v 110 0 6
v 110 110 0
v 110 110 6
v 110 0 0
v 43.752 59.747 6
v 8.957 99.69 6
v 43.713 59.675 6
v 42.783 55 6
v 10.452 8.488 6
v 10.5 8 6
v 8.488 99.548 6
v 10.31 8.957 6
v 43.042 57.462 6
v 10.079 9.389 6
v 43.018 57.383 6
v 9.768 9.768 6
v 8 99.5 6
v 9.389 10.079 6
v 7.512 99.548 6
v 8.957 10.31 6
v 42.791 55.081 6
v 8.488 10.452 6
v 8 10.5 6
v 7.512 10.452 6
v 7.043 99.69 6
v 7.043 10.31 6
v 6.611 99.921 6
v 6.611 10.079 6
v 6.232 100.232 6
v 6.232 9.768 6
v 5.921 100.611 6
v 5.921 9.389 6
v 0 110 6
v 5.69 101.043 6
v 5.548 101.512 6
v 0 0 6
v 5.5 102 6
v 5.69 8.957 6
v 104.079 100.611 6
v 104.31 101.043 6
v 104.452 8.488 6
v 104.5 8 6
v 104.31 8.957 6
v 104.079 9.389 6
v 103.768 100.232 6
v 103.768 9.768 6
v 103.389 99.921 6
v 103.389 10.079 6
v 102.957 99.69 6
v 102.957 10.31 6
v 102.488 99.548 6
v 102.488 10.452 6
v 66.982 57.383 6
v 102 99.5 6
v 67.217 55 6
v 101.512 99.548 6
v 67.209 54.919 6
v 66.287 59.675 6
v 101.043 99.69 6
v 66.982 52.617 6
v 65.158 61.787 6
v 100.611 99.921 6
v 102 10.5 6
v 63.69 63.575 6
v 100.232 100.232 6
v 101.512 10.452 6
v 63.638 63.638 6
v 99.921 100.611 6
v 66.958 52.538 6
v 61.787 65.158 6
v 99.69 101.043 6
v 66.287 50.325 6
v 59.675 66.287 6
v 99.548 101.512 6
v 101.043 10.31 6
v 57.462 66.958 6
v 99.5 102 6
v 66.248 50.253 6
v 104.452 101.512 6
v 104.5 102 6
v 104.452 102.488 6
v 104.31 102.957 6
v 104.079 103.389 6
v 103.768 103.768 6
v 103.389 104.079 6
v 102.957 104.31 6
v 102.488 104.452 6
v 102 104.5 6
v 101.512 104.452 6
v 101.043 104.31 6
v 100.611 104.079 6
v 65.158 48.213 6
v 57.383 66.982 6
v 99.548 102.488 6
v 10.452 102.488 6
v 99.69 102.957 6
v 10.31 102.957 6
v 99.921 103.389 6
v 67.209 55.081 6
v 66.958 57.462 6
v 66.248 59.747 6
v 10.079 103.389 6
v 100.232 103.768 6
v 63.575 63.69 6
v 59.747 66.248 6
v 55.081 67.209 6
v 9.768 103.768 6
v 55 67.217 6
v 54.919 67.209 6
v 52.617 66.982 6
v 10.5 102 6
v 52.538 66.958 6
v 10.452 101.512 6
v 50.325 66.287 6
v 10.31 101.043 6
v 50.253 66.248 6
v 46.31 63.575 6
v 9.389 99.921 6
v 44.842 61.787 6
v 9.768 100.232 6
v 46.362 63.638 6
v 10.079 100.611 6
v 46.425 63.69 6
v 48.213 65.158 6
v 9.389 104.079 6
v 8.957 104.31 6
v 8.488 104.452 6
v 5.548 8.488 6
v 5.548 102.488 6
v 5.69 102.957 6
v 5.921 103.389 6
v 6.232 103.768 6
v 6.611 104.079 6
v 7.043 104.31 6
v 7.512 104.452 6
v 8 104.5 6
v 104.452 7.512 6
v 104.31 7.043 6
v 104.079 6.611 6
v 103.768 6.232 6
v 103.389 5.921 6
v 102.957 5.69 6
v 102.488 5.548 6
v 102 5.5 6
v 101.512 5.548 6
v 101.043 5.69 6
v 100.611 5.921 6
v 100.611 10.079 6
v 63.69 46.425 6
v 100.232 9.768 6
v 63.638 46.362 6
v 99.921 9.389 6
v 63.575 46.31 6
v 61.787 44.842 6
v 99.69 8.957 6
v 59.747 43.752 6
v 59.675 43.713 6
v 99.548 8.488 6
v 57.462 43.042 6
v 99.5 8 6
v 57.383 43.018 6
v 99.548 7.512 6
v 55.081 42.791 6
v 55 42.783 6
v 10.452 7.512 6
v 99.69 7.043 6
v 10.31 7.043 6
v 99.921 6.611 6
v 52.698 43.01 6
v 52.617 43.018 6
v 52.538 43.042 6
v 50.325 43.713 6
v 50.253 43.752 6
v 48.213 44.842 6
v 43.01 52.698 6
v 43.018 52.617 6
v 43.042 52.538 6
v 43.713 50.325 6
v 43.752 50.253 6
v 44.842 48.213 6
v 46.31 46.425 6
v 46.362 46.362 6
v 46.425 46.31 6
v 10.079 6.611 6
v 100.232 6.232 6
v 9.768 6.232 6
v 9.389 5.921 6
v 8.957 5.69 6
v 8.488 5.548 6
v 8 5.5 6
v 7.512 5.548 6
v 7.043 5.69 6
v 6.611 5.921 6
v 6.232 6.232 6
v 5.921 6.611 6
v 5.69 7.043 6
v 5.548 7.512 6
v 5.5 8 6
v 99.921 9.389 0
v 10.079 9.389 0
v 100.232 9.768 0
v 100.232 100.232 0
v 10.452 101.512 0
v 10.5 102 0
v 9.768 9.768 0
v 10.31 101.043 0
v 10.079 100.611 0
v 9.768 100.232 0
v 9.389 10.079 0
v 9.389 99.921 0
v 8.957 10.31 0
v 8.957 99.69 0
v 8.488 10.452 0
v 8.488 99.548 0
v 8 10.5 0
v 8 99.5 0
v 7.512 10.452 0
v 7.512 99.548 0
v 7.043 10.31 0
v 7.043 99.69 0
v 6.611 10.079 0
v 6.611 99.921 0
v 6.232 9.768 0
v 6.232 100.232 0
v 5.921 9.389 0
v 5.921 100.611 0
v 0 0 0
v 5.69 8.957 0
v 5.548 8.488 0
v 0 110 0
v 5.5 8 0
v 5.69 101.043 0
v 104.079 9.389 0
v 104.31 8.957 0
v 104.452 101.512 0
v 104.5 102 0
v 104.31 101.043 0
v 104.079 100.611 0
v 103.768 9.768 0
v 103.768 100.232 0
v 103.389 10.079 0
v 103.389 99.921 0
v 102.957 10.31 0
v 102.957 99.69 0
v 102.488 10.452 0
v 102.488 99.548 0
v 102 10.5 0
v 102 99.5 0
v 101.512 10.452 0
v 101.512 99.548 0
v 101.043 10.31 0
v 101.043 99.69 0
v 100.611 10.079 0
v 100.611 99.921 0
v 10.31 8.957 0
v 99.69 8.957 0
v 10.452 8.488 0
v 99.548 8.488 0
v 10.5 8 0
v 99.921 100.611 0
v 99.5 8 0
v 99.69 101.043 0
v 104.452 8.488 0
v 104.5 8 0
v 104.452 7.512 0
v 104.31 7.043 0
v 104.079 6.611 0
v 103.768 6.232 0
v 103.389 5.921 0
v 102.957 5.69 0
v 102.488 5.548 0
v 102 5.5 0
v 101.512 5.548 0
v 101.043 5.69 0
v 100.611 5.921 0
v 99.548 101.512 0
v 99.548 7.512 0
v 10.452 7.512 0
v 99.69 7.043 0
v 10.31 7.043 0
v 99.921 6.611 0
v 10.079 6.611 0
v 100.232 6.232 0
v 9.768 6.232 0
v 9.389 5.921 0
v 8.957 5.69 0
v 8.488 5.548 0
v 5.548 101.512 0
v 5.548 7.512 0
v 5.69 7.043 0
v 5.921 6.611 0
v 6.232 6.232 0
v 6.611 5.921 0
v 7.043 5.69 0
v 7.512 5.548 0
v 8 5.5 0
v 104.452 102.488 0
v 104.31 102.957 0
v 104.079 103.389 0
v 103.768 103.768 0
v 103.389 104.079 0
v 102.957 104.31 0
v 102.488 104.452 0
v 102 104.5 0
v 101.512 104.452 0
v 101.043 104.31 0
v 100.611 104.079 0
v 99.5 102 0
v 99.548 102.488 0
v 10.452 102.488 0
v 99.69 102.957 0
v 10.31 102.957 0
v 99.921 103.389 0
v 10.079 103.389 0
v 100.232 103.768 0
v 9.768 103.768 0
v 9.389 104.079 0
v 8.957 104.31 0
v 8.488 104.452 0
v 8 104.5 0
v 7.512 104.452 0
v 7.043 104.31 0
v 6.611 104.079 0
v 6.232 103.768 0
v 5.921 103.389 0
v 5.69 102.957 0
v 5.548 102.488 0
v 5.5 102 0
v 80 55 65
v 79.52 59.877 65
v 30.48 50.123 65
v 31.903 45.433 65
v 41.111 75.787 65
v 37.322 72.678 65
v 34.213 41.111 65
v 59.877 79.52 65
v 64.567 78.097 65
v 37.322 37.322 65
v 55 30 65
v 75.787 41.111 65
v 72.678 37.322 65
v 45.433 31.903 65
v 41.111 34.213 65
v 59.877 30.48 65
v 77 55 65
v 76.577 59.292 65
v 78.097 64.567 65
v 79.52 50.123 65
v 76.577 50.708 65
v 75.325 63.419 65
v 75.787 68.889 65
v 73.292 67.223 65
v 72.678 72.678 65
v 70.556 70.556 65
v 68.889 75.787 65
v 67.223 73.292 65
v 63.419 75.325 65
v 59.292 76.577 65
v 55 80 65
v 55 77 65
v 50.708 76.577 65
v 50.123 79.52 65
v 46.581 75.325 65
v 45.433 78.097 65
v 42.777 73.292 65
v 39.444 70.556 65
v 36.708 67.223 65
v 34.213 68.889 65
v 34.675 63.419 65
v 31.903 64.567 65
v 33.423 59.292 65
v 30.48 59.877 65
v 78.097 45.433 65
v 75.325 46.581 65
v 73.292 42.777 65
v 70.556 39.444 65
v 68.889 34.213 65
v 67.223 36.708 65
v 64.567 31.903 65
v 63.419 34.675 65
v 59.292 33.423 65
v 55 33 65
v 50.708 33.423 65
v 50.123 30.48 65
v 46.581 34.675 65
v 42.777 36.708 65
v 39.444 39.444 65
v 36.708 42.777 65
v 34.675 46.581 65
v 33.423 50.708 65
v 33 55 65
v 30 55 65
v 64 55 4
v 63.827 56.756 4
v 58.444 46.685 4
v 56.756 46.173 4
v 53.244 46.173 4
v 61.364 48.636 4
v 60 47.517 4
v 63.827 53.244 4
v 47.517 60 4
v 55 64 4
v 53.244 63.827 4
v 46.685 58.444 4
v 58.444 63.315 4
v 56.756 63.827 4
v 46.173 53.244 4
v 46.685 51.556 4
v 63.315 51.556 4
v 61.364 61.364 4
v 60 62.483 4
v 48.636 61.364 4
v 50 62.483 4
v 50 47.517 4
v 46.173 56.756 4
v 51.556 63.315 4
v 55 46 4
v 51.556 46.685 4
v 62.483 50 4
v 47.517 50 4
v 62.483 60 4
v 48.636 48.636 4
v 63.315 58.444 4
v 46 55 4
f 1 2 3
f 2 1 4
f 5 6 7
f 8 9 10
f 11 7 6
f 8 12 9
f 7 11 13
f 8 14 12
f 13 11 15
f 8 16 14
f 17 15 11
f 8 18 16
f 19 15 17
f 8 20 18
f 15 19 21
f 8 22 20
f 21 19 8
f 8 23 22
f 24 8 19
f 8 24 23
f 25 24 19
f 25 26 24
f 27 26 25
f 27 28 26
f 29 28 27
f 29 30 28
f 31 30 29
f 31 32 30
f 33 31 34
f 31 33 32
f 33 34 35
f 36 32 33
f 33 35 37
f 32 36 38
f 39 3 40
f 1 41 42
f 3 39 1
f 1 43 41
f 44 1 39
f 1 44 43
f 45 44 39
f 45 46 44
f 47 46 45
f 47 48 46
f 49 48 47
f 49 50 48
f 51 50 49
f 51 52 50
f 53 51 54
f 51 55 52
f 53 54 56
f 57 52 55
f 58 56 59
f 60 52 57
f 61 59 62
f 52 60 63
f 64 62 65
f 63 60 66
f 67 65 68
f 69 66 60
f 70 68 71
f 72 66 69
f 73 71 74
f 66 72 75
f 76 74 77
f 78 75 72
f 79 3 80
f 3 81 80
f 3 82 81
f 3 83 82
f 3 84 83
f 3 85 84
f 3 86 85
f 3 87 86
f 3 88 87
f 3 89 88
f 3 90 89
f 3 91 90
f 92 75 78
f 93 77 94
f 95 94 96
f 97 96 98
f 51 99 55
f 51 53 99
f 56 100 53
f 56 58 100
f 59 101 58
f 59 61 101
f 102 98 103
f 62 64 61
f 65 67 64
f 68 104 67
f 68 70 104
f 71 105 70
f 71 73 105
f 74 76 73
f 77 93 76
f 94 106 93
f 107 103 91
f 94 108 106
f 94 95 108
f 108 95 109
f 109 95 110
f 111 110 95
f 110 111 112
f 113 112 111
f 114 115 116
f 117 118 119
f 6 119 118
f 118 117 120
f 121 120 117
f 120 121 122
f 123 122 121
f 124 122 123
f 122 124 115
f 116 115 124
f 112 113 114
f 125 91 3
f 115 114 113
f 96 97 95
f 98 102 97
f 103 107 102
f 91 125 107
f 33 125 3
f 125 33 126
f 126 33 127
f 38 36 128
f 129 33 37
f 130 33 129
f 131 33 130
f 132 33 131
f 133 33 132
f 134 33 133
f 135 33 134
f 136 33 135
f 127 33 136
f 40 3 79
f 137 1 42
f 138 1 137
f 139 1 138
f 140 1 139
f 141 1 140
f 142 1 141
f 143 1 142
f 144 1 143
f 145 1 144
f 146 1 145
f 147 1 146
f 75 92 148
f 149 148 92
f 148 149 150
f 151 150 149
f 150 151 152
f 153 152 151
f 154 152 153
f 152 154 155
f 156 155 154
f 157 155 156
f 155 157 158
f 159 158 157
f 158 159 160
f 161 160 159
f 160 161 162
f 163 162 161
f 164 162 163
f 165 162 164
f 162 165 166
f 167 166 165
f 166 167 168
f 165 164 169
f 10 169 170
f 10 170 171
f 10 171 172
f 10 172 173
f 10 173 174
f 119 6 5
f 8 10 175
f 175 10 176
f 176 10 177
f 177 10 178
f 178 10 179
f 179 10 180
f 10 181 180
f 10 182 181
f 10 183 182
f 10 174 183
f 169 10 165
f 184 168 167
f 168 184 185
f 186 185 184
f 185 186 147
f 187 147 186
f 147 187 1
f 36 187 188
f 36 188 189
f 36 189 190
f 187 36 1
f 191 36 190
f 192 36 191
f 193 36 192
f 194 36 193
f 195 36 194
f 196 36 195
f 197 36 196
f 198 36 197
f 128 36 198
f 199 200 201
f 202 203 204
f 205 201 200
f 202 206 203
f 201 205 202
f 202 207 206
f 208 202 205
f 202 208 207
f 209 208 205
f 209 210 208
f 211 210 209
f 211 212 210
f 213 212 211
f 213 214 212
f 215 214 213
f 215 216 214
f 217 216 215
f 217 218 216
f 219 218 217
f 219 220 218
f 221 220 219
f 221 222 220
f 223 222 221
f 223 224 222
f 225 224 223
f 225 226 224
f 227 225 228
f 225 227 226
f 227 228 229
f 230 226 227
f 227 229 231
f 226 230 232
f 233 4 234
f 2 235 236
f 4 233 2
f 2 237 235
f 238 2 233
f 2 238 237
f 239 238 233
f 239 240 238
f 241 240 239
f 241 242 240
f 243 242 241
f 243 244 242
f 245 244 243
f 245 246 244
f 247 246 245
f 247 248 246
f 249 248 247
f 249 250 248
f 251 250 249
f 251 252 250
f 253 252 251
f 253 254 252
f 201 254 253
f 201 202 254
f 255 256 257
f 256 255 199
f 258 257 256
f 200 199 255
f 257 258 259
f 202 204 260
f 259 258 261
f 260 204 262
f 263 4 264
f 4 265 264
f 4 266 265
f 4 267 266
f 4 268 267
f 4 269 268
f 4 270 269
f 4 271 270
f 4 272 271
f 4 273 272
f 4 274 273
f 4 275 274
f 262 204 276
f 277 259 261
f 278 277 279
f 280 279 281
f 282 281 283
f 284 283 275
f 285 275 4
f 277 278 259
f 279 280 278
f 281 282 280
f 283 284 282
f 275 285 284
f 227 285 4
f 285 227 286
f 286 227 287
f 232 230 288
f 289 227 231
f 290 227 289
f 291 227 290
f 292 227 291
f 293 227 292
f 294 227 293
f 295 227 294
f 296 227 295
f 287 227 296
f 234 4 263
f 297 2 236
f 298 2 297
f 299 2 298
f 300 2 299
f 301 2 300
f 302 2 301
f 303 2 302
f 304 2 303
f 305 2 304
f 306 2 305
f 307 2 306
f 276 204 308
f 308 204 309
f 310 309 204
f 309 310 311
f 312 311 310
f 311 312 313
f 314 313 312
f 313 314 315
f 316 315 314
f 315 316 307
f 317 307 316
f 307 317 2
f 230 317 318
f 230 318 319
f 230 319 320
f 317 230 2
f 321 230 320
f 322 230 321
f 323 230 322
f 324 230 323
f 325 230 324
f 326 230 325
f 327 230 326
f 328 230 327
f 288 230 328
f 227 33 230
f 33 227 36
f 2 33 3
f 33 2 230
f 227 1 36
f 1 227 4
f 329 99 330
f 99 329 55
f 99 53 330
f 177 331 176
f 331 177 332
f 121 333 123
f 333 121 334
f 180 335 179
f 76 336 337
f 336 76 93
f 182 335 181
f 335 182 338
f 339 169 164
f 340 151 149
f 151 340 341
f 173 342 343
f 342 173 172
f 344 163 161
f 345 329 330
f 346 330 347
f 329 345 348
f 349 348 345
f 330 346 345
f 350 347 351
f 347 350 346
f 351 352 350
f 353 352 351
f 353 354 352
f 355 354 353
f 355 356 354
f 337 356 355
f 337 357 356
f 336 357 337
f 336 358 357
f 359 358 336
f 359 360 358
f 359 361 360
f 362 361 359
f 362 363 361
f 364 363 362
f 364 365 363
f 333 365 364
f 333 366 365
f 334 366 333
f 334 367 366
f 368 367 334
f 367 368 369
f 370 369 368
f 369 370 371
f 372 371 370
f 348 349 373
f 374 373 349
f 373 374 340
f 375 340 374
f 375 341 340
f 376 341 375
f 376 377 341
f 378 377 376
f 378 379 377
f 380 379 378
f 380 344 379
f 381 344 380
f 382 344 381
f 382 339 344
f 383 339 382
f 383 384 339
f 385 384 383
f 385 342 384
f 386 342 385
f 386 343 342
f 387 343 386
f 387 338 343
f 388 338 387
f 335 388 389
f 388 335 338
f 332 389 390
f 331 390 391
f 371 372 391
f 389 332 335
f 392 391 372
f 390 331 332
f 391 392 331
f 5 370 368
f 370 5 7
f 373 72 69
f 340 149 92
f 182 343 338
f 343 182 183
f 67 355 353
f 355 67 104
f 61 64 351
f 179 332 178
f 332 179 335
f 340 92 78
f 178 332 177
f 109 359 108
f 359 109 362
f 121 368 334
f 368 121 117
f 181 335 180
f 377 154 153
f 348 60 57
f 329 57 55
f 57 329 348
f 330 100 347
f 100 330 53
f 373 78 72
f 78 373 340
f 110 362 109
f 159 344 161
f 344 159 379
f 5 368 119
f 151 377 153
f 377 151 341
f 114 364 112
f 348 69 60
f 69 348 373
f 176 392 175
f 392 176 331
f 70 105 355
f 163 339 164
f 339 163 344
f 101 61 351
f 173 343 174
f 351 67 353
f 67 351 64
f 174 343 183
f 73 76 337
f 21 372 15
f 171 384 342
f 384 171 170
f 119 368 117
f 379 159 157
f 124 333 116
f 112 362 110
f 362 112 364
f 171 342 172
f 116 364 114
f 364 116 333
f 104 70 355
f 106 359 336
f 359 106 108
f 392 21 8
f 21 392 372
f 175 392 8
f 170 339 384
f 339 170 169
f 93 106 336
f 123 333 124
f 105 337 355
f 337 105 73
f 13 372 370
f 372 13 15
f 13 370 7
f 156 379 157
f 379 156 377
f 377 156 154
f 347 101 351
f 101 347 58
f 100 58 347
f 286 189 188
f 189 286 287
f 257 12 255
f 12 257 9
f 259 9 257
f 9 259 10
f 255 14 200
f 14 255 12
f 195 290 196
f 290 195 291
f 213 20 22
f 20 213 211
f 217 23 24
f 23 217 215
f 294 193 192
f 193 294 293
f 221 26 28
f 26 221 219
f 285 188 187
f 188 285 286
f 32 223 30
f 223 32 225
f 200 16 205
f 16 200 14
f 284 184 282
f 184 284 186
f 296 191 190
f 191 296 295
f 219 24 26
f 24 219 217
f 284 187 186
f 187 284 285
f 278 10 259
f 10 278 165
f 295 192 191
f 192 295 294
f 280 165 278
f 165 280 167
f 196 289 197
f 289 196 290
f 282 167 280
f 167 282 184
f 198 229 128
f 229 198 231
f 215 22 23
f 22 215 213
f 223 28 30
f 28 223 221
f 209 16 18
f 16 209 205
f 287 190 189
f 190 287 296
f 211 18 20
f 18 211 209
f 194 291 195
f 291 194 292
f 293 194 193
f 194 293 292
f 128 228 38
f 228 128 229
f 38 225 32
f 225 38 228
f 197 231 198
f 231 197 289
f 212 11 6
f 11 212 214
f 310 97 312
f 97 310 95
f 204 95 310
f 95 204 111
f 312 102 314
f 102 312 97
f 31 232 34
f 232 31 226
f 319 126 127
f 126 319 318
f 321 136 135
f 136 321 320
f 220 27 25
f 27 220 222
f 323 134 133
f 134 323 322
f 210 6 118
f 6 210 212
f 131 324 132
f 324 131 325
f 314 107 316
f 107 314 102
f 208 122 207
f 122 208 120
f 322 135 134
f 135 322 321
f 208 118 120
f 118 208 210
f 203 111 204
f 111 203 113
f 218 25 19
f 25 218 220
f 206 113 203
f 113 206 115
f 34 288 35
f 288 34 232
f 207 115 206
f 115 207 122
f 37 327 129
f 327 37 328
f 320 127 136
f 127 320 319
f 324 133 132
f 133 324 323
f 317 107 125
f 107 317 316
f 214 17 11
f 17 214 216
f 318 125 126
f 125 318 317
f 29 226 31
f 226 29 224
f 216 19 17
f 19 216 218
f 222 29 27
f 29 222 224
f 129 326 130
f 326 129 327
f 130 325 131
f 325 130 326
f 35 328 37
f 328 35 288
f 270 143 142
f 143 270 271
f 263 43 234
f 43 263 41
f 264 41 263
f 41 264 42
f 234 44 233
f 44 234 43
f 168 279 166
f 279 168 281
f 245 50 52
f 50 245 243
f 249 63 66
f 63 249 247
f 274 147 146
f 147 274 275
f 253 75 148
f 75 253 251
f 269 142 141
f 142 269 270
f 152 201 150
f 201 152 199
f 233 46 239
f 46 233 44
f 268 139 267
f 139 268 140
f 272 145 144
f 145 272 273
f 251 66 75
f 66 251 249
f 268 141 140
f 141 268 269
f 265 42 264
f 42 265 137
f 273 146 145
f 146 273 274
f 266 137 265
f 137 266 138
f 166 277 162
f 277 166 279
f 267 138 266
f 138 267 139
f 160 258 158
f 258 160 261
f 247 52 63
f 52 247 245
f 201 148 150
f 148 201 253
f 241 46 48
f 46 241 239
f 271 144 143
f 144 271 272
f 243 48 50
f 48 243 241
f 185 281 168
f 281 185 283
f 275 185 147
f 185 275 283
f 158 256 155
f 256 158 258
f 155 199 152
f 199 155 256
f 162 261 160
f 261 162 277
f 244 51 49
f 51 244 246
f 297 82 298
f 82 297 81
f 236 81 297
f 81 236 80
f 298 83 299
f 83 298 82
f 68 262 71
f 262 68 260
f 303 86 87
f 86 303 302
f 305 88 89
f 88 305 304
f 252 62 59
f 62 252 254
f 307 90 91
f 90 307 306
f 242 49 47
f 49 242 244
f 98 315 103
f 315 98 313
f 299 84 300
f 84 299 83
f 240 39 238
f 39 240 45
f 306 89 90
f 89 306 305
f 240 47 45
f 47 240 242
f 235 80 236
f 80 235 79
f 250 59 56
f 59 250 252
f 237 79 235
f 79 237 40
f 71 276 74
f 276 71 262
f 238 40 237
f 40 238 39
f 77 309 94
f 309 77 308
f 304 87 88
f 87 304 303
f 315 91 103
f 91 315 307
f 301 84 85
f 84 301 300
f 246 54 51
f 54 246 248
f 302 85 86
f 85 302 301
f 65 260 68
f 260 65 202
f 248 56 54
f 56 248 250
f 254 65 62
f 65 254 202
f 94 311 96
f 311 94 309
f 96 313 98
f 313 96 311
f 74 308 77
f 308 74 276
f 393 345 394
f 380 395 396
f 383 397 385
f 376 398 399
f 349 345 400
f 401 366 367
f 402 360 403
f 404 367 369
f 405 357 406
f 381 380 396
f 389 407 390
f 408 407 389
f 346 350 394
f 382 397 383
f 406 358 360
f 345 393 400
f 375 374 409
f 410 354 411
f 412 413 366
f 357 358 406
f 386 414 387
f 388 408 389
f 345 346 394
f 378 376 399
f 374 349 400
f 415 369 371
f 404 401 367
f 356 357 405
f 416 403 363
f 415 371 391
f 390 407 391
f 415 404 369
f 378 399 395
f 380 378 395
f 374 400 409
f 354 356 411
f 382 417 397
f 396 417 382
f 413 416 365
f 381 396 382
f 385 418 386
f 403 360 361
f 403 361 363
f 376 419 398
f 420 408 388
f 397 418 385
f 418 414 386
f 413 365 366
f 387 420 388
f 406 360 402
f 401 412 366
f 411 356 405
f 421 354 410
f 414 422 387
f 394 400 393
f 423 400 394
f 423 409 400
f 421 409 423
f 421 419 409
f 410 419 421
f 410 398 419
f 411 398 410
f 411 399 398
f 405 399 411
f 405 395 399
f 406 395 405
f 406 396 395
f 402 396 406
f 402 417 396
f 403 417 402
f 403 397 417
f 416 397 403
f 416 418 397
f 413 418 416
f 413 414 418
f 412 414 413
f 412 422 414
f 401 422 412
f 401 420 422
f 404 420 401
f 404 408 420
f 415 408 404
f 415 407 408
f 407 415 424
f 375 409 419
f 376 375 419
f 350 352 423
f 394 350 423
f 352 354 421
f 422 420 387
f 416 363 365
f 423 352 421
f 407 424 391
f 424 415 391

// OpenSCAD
$fn = 32;

// ----------------------------------------------------------------------
// Hopper: flanged with square flange
// ----------------------------------------------------------------------

// --- parameters (mm) ---
fl = 110;                 // flange side, X and Y
fl_t = 6;                 // flange thickness
cone_h = 60;              // cone height above the flange
top_d = 50;               // cone mouth diameter
bot_d = 24;               // cone spout diameter
wall = 3;                 // cone wall thickness
hole_r = 2.5;             // flange hole radius
hole_in = 8;              // hole inset from the corners
fit_tol = 0.1;            // tolerance for press fits, mm
free_tol = 0.5;           // tolerance for clearance fits, mm

bore_d = bot_d - 2 * wall;  // spout bore diameter
total_h = fl_t + cone_h - 1;  // overall height

difference() {
  union() {
    cube([fl, fl, fl_t]);
    translate([fl / 2, fl / 2, fl_t - 1])
      cylinder(h = cone_h, d1 = bot_d, d2 = top_d);
  }
  translate([fl / 2, fl / 2, fl_t - 2])
    cylinder(h = cone_h + 1, d1 = bore_d, d2 = top_d - 2 * wall);
  for (sx = [0, 1], sy = [0, 1])
    translate([sx ? fl - hole_in : hole_in,
               sy ? fl - hole_in : hole_in, -1])
      cylinder(r = hole_r, h = fl_t + 2);
}
